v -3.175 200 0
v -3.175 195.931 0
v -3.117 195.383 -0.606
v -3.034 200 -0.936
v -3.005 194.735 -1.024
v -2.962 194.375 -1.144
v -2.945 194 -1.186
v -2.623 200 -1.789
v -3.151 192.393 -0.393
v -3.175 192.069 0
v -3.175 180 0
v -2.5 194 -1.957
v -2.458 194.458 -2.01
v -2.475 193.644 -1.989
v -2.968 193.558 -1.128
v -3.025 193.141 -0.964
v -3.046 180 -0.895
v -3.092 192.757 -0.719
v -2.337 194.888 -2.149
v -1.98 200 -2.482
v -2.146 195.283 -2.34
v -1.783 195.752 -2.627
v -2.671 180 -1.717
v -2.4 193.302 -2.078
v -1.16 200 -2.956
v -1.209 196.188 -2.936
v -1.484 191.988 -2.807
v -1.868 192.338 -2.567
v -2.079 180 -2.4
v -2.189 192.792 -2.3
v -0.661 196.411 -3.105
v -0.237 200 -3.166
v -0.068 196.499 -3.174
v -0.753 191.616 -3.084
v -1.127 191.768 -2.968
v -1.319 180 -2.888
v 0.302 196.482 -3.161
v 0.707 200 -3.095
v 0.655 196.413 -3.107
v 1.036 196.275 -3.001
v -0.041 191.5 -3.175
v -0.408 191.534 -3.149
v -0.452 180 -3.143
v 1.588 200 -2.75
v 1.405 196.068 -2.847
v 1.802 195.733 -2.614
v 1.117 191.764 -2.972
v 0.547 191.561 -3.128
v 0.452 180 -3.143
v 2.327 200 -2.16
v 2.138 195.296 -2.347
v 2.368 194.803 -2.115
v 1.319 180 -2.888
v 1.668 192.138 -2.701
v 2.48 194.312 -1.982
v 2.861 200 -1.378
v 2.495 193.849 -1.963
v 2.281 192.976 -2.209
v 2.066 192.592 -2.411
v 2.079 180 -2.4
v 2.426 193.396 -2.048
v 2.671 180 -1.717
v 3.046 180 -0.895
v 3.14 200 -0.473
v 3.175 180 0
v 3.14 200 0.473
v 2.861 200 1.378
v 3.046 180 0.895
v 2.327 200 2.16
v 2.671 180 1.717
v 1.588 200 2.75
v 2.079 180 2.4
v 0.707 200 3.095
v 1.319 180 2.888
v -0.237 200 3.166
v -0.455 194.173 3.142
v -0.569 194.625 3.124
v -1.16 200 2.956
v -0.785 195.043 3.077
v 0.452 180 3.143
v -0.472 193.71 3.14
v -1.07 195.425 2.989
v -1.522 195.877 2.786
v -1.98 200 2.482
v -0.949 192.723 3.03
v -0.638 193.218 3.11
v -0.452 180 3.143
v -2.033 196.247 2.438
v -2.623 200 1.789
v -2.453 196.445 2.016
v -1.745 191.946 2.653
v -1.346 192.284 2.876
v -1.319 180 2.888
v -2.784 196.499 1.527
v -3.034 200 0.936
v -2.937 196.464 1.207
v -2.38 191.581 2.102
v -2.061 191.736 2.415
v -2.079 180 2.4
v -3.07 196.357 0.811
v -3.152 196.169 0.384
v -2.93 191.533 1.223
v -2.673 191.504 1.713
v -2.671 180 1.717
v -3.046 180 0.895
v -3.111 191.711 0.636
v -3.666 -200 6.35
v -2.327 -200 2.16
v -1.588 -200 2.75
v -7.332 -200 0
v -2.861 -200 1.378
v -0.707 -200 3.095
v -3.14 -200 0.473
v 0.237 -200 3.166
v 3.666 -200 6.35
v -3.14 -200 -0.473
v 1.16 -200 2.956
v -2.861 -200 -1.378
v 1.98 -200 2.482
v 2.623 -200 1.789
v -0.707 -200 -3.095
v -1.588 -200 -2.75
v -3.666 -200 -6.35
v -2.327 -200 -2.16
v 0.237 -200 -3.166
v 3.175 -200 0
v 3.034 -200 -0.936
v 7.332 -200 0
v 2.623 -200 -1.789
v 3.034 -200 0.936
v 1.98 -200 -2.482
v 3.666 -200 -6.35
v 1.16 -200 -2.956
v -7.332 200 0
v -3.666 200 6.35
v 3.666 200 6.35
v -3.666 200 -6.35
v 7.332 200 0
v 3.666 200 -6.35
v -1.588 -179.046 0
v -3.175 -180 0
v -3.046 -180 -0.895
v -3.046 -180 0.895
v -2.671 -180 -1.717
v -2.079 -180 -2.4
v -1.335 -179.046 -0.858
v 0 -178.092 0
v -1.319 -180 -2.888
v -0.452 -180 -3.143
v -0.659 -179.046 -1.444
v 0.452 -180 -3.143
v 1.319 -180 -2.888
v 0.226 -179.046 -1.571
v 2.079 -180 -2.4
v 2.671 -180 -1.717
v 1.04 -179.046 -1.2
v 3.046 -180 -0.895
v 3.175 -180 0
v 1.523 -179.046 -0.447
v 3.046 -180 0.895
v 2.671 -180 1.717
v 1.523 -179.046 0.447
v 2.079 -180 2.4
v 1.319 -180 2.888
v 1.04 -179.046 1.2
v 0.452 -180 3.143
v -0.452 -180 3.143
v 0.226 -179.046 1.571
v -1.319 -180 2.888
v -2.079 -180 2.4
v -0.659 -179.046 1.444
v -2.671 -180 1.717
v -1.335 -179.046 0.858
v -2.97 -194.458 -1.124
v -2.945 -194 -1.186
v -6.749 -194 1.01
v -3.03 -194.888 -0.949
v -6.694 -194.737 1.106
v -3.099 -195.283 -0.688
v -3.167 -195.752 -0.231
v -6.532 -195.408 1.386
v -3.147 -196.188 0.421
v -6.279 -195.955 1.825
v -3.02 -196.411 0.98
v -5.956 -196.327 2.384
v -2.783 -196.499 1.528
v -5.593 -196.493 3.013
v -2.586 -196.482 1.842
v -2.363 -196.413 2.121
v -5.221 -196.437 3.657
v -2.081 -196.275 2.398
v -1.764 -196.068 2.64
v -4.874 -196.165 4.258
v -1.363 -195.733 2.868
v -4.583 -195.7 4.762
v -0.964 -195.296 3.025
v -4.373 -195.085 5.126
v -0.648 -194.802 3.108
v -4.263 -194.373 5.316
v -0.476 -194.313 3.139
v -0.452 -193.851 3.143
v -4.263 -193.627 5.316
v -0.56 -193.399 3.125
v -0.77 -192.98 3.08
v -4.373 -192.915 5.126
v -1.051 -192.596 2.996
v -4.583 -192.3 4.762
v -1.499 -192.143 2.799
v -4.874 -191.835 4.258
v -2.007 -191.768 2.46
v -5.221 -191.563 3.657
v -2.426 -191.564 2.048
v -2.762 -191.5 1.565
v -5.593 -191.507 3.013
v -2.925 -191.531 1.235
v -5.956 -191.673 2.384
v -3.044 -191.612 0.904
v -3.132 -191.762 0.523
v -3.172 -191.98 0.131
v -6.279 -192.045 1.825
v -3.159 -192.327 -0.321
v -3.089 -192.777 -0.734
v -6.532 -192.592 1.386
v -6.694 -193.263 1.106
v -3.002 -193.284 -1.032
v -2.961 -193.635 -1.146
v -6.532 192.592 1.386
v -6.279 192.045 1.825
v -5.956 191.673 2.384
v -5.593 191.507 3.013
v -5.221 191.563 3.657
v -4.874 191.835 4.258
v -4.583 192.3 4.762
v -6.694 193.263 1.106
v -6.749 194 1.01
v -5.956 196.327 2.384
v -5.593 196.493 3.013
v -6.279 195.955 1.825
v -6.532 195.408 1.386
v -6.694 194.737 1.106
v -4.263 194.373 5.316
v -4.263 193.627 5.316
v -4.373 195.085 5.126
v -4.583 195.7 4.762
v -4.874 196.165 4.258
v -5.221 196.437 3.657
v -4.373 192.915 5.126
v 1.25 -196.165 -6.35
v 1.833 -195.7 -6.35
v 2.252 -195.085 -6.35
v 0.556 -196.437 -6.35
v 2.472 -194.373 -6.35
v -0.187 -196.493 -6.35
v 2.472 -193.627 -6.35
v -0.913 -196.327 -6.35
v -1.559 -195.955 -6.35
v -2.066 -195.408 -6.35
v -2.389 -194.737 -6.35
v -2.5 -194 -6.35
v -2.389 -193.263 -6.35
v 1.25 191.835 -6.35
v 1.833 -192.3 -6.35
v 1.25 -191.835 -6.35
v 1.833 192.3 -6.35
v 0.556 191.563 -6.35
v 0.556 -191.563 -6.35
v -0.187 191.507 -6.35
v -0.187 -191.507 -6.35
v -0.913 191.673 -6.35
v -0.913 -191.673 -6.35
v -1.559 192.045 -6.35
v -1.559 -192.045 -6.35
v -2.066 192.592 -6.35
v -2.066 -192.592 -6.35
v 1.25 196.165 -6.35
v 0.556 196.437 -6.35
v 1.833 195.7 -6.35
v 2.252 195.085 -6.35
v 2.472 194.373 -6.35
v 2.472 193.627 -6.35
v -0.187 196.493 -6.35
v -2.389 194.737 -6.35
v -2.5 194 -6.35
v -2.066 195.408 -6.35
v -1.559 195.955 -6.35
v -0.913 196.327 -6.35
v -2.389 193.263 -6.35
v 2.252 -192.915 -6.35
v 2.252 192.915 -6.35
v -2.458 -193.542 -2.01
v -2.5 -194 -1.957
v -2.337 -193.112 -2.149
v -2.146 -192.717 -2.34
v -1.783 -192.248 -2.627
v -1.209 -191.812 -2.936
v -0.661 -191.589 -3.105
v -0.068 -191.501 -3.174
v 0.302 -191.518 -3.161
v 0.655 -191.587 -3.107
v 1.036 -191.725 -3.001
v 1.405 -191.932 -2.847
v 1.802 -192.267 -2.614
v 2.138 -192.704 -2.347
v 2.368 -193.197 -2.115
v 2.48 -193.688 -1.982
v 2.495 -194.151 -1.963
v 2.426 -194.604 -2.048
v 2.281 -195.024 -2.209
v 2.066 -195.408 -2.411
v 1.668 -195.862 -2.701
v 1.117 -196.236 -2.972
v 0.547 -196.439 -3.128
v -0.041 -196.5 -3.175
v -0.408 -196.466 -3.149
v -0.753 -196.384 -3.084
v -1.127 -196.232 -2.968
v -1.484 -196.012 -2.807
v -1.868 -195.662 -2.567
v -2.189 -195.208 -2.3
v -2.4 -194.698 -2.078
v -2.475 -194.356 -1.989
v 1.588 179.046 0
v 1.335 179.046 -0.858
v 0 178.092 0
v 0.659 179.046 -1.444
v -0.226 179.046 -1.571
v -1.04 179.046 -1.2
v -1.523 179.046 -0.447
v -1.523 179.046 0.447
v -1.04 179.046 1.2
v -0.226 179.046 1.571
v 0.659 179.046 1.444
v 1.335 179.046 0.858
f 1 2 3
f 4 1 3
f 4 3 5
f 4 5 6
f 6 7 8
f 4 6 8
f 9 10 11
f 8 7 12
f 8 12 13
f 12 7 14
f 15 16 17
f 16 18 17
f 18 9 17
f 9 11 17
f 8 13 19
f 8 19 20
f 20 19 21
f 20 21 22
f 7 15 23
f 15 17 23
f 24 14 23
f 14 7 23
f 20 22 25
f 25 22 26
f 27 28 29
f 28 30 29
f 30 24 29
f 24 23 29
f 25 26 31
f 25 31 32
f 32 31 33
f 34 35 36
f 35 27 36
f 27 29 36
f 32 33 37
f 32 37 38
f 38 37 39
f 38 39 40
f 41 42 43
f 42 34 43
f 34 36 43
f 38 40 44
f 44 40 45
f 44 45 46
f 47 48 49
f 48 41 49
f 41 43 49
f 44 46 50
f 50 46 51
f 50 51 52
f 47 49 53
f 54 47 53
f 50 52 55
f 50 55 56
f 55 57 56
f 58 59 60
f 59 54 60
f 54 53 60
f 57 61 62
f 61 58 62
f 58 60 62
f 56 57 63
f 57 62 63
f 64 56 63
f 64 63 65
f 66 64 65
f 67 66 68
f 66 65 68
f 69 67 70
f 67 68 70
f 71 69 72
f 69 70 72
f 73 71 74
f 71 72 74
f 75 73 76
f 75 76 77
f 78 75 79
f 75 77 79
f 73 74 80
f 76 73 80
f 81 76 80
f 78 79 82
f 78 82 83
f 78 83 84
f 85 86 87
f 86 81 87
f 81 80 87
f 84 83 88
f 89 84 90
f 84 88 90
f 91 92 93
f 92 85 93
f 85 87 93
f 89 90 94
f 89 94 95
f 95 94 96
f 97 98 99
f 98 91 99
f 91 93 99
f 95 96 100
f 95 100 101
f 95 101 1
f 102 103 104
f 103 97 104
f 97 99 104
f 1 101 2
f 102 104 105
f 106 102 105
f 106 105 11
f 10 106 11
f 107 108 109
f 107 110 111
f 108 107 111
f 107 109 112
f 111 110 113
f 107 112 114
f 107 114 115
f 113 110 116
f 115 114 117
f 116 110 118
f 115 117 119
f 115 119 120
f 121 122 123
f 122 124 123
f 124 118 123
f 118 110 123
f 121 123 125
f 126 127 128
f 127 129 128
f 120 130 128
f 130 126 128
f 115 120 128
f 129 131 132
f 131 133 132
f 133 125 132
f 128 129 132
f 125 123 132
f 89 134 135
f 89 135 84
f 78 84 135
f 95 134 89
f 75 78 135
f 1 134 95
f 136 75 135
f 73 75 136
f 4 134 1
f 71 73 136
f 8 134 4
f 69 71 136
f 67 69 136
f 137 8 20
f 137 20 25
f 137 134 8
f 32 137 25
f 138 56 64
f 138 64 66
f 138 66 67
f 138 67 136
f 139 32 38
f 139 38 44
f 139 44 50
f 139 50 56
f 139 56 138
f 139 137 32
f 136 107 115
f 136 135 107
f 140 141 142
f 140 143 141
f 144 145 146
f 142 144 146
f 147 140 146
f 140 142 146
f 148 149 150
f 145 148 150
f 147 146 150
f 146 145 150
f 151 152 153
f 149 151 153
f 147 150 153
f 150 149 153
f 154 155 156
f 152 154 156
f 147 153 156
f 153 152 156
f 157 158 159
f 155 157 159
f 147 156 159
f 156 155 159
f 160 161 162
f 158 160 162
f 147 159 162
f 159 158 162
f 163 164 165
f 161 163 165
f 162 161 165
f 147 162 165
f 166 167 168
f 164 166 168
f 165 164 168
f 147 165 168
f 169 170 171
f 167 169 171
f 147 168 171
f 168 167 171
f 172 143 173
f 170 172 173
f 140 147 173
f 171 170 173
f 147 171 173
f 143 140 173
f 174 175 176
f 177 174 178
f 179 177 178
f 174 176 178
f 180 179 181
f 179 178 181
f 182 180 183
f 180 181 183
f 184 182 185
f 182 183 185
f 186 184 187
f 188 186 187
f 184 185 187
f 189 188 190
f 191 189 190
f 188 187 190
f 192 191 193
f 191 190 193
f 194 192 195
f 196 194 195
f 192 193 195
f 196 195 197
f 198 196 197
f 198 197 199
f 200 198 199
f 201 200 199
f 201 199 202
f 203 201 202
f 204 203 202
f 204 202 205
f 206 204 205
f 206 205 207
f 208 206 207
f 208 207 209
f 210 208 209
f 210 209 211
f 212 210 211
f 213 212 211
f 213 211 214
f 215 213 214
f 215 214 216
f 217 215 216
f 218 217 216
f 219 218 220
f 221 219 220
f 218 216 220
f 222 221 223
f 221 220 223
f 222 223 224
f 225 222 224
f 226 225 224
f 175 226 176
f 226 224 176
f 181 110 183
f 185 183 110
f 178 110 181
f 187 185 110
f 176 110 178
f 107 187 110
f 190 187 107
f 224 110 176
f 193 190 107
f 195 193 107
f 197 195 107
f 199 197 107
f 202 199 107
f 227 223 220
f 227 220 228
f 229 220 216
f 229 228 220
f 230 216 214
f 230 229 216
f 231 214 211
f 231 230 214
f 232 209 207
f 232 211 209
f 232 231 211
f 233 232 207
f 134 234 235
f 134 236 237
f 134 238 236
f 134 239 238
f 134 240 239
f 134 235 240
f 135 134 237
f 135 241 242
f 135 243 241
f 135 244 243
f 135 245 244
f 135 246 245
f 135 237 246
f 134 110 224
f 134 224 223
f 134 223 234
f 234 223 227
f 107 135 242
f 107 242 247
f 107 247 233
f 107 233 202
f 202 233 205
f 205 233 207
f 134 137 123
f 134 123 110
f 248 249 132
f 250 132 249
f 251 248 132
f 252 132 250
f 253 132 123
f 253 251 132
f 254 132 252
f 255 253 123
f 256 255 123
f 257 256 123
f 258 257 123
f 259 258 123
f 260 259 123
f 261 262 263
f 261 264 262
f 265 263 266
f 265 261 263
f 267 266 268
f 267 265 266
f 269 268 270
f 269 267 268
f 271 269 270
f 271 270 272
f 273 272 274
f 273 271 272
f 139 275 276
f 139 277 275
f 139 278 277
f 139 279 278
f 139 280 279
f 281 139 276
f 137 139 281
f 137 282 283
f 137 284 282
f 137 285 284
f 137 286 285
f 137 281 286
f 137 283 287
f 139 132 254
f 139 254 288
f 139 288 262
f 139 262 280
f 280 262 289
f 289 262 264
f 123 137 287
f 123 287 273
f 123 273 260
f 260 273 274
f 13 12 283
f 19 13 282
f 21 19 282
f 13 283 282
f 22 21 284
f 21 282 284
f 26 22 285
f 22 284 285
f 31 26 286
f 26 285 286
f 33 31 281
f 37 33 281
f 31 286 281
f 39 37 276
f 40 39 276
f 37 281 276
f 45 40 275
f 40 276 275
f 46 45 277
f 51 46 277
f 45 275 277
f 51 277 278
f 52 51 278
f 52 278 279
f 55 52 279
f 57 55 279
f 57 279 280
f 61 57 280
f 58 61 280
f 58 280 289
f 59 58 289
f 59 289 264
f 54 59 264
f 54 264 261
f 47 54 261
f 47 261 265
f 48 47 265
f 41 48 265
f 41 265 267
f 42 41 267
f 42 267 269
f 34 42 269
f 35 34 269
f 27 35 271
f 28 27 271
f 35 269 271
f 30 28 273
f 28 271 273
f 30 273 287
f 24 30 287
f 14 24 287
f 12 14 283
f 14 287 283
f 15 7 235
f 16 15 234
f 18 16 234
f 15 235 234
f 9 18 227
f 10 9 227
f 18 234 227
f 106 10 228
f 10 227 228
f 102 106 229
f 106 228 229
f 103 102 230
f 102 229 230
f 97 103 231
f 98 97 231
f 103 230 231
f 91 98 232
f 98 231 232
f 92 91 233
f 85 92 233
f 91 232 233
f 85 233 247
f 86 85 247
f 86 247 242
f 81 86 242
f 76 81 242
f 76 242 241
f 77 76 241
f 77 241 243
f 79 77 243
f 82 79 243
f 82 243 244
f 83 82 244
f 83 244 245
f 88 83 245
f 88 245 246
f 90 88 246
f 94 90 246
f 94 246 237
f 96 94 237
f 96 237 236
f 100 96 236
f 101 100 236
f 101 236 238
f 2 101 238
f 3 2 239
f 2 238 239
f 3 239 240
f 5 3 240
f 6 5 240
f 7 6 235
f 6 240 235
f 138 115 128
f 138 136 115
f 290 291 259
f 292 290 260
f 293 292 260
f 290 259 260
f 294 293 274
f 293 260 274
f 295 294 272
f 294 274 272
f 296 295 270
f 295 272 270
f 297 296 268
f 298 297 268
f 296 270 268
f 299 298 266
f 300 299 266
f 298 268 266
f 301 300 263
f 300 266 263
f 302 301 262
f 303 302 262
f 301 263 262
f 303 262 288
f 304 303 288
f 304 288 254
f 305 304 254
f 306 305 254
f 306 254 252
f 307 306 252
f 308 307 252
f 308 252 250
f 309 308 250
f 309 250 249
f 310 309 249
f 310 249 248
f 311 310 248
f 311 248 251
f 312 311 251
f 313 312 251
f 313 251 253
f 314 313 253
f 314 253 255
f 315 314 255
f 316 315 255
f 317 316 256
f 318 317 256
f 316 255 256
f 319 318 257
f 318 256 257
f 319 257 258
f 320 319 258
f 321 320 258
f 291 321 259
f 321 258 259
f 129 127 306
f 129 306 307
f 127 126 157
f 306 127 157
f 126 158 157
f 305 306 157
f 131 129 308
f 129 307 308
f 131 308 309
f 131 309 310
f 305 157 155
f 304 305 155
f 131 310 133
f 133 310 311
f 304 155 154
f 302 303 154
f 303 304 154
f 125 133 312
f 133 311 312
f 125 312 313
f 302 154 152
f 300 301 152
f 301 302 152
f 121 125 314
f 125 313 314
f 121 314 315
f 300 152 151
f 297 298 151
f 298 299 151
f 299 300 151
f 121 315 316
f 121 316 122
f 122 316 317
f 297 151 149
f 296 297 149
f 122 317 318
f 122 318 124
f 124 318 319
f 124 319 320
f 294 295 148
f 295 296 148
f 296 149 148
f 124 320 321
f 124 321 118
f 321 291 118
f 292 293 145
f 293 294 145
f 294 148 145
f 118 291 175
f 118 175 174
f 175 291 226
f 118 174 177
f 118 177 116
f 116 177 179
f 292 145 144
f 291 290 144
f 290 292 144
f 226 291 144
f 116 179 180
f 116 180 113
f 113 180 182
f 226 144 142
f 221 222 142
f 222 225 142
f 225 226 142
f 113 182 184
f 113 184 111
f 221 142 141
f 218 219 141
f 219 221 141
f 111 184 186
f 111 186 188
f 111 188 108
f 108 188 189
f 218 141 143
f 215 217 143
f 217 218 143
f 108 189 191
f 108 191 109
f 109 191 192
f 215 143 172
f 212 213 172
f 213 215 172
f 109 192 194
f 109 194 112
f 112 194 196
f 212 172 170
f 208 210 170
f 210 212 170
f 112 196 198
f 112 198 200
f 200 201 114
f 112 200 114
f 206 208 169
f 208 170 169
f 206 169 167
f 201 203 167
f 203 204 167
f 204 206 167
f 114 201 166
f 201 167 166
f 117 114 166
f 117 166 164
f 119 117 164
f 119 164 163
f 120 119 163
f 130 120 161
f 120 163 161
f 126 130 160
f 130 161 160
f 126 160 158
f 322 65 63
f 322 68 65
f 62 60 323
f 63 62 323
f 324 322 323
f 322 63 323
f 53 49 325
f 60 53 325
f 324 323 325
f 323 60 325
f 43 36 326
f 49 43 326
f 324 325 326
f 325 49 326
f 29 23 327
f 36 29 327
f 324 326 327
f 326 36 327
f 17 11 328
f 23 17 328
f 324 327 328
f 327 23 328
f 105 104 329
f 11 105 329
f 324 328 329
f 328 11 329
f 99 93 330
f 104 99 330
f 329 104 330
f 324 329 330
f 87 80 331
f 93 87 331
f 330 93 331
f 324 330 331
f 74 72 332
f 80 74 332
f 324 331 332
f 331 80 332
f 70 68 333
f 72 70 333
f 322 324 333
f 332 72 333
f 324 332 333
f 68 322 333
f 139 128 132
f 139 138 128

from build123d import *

# Parameters (mm, degrees)
BOSS_EXTRUDE1_DEPTH             = 200
F_1_4_0_25_DIAMETER_HOLE1_D     = 6.35
F_1_4_0_25_DIAMETER_HOLE1_DEPTH = 20
F_1_4_0_25_DIAMETER_HOLE1_TIP   = 1.907732465
F_1_4_0_25_DIAMETER_HOLE2_D     = 6.35
F_1_4_0_25_DIAMETER_HOLE2_DEPTH = 20
F_1_4_0_25_DIAMETER_HOLE2_TIP   = 1.907732465
M6X1_0_TAPPED_HOLE3_REACH       = 202.537
M6X1_0_TAPPED_HOLE3_BORE_R      = 2.5
M6X1_0_TAPPED_HOLE4_REACH       = 202.637
M6X1_0_TAPPED_HOLE4_BORE_R      = 2.5


with BuildPart() as part:
    # Sketch1 → Boss-Extrude1 (new, symmetric)
    with BuildSketch(Plane(origin=(0, 0, 0), x_dir=(1, 0, 0), z_dir=(0, 1, 0))):
        Polygon((7.332348419, 0), (3.666174209, 6.35), (-3.666174209, 6.35), (-7.332348419, 0), (-3.666174209, -6.35), (3.666174209, -6.35), align=None)
    extrude(amount=BOSS_EXTRUDE1_DEPTH, both=True)

    # 1_4 _0.25_ Diameter Hole1
    with Locations(Plane(origin=(0, 200, 0), x_dir=(1, 0, 0), z_dir=(0, 1, 0))):
        with Locations((0, 0)):
            Hole(F_1_4_0_25_DIAMETER_HOLE1_D / 2, depth=F_1_4_0_25_DIAMETER_HOLE1_DEPTH)
            with Locations((0, 0, -(F_1_4_0_25_DIAMETER_HOLE1_DEPTH + F_1_4_0_25_DIAMETER_HOLE1_TIP / 2))):  # 118° drill point
                Cone(0, F_1_4_0_25_DIAMETER_HOLE1_D / 2, F_1_4_0_25_DIAMETER_HOLE1_TIP, mode=Mode.SUBTRACT)

    # 1_4 _0.25_ Diameter Hole2
    with Locations(Plane(origin=(0, -200, 0), x_dir=(-1, 0, 0), z_dir=(0, -1, 0))):
        with Locations((0, 0)):
            Hole(F_1_4_0_25_DIAMETER_HOLE2_D / 2, depth=F_1_4_0_25_DIAMETER_HOLE2_DEPTH)
            with Locations((0, 0, -(F_1_4_0_25_DIAMETER_HOLE2_DEPTH + F_1_4_0_25_DIAMETER_HOLE2_TIP / 2))):  # 118° drill point
                Cone(0, F_1_4_0_25_DIAMETER_HOLE2_D / 2, F_1_4_0_25_DIAMETER_HOLE2_TIP, mode=Mode.SUBTRACT)

    # M6x1.0 Tapped Hole3 bore → M6x1.0 Tapped Hole3 (cut, up to next)
    with BuildSketch(Plane(origin=(0, 0, -6.35), x_dir=(-1, 0, 0), z_dir=(0, 0, -1)), mode=Mode.PRIVATE) as m6x1_0_tapped_hole3_sk1:
        with Locations((0, -194)):
            Circle(M6X1_0_TAPPED_HOLE3_BORE_R)
    m6x1_0_tapped_hole3_tool1 = extrude(m6x1_0_tapped_hole3_sk1.sketch, amount=-M6X1_0_TAPPED_HOLE3_REACH, mode=Mode.PRIVATE) & part.part
    # M6x1.0 Tapped Hole3 bore → M6x1.0 Tapped Hole3 (cut, up to next)
    with BuildSketch(Plane(origin=(0, 0, -6.35), x_dir=(-1, 0, 0), z_dir=(0, 0, -1)), mode=Mode.PRIVATE) as m6x1_0_tapped_hole3_sk2:
        with Locations((0, 194)):
            Circle(M6X1_0_TAPPED_HOLE3_BORE_R)
    m6x1_0_tapped_hole3_tool2 = extrude(m6x1_0_tapped_hole3_sk2.sketch, amount=-M6X1_0_TAPPED_HOLE3_REACH, mode=Mode.PRIVATE) & part.part
    add(m6x1_0_tapped_hole3_tool1.solids().sort_by_distance((0, -194, -6.35))[0], mode=Mode.SUBTRACT)
    add(m6x1_0_tapped_hole3_tool2.solids().sort_by_distance((0, 194, -6.35))[0], mode=Mode.SUBTRACT)

    # M6x1.0 Tapped Hole4 bore → M6x1.0 Tapped Hole4 (cut, up to next)
    with BuildSketch(Plane(origin=(-5.499261314, 0, 3.175), x_dir=(-0.5000000000000001, 0, -0.8660254037844386), z_dir=(-0.8660254037844386, 0, 0.5000000000000001)), mode=Mode.PRIVATE) as m6x1_0_tapped_hole4_sk1:
        with Locations((0, -194)):
            Circle(M6X1_0_TAPPED_HOLE4_BORE_R)
    m6x1_0_tapped_hole4_tool1 = extrude(m6x1_0_tapped_hole4_sk1.sketch, amount=-M6X1_0_TAPPED_HOLE4_REACH, mode=Mode.PRIVATE) & part.part
    # M6x1.0 Tapped Hole4 bore → M6x1.0 Tapped Hole4 (cut, up to next)
    with BuildSketch(Plane(origin=(-5.499261314, 0, 3.175), x_dir=(-0.5000000000000001, 0, -0.8660254037844386), z_dir=(-0.8660254037844386, 0, 0.5000000000000001)), mode=Mode.PRIVATE) as m6x1_0_tapped_hole4_sk2:
        with Locations((0, 194)):
            Circle(M6X1_0_TAPPED_HOLE4_BORE_R)
    m6x1_0_tapped_hole4_tool2 = extrude(m6x1_0_tapped_hole4_sk2.sketch, amount=-M6X1_0_TAPPED_HOLE4_REACH, mode=Mode.PRIVATE) & part.part
    add(m6x1_0_tapped_hole4_tool1.solids().sort_by_distance((-5.499261, 194, 3.175))[0], mode=Mode.SUBTRACT)
    add(m6x1_0_tapped_hole4_tool2.solids().sort_by_distance((-5.499261, -194, 3.175))[0], mode=Mode.SUBTRACT)


solid = part.part
